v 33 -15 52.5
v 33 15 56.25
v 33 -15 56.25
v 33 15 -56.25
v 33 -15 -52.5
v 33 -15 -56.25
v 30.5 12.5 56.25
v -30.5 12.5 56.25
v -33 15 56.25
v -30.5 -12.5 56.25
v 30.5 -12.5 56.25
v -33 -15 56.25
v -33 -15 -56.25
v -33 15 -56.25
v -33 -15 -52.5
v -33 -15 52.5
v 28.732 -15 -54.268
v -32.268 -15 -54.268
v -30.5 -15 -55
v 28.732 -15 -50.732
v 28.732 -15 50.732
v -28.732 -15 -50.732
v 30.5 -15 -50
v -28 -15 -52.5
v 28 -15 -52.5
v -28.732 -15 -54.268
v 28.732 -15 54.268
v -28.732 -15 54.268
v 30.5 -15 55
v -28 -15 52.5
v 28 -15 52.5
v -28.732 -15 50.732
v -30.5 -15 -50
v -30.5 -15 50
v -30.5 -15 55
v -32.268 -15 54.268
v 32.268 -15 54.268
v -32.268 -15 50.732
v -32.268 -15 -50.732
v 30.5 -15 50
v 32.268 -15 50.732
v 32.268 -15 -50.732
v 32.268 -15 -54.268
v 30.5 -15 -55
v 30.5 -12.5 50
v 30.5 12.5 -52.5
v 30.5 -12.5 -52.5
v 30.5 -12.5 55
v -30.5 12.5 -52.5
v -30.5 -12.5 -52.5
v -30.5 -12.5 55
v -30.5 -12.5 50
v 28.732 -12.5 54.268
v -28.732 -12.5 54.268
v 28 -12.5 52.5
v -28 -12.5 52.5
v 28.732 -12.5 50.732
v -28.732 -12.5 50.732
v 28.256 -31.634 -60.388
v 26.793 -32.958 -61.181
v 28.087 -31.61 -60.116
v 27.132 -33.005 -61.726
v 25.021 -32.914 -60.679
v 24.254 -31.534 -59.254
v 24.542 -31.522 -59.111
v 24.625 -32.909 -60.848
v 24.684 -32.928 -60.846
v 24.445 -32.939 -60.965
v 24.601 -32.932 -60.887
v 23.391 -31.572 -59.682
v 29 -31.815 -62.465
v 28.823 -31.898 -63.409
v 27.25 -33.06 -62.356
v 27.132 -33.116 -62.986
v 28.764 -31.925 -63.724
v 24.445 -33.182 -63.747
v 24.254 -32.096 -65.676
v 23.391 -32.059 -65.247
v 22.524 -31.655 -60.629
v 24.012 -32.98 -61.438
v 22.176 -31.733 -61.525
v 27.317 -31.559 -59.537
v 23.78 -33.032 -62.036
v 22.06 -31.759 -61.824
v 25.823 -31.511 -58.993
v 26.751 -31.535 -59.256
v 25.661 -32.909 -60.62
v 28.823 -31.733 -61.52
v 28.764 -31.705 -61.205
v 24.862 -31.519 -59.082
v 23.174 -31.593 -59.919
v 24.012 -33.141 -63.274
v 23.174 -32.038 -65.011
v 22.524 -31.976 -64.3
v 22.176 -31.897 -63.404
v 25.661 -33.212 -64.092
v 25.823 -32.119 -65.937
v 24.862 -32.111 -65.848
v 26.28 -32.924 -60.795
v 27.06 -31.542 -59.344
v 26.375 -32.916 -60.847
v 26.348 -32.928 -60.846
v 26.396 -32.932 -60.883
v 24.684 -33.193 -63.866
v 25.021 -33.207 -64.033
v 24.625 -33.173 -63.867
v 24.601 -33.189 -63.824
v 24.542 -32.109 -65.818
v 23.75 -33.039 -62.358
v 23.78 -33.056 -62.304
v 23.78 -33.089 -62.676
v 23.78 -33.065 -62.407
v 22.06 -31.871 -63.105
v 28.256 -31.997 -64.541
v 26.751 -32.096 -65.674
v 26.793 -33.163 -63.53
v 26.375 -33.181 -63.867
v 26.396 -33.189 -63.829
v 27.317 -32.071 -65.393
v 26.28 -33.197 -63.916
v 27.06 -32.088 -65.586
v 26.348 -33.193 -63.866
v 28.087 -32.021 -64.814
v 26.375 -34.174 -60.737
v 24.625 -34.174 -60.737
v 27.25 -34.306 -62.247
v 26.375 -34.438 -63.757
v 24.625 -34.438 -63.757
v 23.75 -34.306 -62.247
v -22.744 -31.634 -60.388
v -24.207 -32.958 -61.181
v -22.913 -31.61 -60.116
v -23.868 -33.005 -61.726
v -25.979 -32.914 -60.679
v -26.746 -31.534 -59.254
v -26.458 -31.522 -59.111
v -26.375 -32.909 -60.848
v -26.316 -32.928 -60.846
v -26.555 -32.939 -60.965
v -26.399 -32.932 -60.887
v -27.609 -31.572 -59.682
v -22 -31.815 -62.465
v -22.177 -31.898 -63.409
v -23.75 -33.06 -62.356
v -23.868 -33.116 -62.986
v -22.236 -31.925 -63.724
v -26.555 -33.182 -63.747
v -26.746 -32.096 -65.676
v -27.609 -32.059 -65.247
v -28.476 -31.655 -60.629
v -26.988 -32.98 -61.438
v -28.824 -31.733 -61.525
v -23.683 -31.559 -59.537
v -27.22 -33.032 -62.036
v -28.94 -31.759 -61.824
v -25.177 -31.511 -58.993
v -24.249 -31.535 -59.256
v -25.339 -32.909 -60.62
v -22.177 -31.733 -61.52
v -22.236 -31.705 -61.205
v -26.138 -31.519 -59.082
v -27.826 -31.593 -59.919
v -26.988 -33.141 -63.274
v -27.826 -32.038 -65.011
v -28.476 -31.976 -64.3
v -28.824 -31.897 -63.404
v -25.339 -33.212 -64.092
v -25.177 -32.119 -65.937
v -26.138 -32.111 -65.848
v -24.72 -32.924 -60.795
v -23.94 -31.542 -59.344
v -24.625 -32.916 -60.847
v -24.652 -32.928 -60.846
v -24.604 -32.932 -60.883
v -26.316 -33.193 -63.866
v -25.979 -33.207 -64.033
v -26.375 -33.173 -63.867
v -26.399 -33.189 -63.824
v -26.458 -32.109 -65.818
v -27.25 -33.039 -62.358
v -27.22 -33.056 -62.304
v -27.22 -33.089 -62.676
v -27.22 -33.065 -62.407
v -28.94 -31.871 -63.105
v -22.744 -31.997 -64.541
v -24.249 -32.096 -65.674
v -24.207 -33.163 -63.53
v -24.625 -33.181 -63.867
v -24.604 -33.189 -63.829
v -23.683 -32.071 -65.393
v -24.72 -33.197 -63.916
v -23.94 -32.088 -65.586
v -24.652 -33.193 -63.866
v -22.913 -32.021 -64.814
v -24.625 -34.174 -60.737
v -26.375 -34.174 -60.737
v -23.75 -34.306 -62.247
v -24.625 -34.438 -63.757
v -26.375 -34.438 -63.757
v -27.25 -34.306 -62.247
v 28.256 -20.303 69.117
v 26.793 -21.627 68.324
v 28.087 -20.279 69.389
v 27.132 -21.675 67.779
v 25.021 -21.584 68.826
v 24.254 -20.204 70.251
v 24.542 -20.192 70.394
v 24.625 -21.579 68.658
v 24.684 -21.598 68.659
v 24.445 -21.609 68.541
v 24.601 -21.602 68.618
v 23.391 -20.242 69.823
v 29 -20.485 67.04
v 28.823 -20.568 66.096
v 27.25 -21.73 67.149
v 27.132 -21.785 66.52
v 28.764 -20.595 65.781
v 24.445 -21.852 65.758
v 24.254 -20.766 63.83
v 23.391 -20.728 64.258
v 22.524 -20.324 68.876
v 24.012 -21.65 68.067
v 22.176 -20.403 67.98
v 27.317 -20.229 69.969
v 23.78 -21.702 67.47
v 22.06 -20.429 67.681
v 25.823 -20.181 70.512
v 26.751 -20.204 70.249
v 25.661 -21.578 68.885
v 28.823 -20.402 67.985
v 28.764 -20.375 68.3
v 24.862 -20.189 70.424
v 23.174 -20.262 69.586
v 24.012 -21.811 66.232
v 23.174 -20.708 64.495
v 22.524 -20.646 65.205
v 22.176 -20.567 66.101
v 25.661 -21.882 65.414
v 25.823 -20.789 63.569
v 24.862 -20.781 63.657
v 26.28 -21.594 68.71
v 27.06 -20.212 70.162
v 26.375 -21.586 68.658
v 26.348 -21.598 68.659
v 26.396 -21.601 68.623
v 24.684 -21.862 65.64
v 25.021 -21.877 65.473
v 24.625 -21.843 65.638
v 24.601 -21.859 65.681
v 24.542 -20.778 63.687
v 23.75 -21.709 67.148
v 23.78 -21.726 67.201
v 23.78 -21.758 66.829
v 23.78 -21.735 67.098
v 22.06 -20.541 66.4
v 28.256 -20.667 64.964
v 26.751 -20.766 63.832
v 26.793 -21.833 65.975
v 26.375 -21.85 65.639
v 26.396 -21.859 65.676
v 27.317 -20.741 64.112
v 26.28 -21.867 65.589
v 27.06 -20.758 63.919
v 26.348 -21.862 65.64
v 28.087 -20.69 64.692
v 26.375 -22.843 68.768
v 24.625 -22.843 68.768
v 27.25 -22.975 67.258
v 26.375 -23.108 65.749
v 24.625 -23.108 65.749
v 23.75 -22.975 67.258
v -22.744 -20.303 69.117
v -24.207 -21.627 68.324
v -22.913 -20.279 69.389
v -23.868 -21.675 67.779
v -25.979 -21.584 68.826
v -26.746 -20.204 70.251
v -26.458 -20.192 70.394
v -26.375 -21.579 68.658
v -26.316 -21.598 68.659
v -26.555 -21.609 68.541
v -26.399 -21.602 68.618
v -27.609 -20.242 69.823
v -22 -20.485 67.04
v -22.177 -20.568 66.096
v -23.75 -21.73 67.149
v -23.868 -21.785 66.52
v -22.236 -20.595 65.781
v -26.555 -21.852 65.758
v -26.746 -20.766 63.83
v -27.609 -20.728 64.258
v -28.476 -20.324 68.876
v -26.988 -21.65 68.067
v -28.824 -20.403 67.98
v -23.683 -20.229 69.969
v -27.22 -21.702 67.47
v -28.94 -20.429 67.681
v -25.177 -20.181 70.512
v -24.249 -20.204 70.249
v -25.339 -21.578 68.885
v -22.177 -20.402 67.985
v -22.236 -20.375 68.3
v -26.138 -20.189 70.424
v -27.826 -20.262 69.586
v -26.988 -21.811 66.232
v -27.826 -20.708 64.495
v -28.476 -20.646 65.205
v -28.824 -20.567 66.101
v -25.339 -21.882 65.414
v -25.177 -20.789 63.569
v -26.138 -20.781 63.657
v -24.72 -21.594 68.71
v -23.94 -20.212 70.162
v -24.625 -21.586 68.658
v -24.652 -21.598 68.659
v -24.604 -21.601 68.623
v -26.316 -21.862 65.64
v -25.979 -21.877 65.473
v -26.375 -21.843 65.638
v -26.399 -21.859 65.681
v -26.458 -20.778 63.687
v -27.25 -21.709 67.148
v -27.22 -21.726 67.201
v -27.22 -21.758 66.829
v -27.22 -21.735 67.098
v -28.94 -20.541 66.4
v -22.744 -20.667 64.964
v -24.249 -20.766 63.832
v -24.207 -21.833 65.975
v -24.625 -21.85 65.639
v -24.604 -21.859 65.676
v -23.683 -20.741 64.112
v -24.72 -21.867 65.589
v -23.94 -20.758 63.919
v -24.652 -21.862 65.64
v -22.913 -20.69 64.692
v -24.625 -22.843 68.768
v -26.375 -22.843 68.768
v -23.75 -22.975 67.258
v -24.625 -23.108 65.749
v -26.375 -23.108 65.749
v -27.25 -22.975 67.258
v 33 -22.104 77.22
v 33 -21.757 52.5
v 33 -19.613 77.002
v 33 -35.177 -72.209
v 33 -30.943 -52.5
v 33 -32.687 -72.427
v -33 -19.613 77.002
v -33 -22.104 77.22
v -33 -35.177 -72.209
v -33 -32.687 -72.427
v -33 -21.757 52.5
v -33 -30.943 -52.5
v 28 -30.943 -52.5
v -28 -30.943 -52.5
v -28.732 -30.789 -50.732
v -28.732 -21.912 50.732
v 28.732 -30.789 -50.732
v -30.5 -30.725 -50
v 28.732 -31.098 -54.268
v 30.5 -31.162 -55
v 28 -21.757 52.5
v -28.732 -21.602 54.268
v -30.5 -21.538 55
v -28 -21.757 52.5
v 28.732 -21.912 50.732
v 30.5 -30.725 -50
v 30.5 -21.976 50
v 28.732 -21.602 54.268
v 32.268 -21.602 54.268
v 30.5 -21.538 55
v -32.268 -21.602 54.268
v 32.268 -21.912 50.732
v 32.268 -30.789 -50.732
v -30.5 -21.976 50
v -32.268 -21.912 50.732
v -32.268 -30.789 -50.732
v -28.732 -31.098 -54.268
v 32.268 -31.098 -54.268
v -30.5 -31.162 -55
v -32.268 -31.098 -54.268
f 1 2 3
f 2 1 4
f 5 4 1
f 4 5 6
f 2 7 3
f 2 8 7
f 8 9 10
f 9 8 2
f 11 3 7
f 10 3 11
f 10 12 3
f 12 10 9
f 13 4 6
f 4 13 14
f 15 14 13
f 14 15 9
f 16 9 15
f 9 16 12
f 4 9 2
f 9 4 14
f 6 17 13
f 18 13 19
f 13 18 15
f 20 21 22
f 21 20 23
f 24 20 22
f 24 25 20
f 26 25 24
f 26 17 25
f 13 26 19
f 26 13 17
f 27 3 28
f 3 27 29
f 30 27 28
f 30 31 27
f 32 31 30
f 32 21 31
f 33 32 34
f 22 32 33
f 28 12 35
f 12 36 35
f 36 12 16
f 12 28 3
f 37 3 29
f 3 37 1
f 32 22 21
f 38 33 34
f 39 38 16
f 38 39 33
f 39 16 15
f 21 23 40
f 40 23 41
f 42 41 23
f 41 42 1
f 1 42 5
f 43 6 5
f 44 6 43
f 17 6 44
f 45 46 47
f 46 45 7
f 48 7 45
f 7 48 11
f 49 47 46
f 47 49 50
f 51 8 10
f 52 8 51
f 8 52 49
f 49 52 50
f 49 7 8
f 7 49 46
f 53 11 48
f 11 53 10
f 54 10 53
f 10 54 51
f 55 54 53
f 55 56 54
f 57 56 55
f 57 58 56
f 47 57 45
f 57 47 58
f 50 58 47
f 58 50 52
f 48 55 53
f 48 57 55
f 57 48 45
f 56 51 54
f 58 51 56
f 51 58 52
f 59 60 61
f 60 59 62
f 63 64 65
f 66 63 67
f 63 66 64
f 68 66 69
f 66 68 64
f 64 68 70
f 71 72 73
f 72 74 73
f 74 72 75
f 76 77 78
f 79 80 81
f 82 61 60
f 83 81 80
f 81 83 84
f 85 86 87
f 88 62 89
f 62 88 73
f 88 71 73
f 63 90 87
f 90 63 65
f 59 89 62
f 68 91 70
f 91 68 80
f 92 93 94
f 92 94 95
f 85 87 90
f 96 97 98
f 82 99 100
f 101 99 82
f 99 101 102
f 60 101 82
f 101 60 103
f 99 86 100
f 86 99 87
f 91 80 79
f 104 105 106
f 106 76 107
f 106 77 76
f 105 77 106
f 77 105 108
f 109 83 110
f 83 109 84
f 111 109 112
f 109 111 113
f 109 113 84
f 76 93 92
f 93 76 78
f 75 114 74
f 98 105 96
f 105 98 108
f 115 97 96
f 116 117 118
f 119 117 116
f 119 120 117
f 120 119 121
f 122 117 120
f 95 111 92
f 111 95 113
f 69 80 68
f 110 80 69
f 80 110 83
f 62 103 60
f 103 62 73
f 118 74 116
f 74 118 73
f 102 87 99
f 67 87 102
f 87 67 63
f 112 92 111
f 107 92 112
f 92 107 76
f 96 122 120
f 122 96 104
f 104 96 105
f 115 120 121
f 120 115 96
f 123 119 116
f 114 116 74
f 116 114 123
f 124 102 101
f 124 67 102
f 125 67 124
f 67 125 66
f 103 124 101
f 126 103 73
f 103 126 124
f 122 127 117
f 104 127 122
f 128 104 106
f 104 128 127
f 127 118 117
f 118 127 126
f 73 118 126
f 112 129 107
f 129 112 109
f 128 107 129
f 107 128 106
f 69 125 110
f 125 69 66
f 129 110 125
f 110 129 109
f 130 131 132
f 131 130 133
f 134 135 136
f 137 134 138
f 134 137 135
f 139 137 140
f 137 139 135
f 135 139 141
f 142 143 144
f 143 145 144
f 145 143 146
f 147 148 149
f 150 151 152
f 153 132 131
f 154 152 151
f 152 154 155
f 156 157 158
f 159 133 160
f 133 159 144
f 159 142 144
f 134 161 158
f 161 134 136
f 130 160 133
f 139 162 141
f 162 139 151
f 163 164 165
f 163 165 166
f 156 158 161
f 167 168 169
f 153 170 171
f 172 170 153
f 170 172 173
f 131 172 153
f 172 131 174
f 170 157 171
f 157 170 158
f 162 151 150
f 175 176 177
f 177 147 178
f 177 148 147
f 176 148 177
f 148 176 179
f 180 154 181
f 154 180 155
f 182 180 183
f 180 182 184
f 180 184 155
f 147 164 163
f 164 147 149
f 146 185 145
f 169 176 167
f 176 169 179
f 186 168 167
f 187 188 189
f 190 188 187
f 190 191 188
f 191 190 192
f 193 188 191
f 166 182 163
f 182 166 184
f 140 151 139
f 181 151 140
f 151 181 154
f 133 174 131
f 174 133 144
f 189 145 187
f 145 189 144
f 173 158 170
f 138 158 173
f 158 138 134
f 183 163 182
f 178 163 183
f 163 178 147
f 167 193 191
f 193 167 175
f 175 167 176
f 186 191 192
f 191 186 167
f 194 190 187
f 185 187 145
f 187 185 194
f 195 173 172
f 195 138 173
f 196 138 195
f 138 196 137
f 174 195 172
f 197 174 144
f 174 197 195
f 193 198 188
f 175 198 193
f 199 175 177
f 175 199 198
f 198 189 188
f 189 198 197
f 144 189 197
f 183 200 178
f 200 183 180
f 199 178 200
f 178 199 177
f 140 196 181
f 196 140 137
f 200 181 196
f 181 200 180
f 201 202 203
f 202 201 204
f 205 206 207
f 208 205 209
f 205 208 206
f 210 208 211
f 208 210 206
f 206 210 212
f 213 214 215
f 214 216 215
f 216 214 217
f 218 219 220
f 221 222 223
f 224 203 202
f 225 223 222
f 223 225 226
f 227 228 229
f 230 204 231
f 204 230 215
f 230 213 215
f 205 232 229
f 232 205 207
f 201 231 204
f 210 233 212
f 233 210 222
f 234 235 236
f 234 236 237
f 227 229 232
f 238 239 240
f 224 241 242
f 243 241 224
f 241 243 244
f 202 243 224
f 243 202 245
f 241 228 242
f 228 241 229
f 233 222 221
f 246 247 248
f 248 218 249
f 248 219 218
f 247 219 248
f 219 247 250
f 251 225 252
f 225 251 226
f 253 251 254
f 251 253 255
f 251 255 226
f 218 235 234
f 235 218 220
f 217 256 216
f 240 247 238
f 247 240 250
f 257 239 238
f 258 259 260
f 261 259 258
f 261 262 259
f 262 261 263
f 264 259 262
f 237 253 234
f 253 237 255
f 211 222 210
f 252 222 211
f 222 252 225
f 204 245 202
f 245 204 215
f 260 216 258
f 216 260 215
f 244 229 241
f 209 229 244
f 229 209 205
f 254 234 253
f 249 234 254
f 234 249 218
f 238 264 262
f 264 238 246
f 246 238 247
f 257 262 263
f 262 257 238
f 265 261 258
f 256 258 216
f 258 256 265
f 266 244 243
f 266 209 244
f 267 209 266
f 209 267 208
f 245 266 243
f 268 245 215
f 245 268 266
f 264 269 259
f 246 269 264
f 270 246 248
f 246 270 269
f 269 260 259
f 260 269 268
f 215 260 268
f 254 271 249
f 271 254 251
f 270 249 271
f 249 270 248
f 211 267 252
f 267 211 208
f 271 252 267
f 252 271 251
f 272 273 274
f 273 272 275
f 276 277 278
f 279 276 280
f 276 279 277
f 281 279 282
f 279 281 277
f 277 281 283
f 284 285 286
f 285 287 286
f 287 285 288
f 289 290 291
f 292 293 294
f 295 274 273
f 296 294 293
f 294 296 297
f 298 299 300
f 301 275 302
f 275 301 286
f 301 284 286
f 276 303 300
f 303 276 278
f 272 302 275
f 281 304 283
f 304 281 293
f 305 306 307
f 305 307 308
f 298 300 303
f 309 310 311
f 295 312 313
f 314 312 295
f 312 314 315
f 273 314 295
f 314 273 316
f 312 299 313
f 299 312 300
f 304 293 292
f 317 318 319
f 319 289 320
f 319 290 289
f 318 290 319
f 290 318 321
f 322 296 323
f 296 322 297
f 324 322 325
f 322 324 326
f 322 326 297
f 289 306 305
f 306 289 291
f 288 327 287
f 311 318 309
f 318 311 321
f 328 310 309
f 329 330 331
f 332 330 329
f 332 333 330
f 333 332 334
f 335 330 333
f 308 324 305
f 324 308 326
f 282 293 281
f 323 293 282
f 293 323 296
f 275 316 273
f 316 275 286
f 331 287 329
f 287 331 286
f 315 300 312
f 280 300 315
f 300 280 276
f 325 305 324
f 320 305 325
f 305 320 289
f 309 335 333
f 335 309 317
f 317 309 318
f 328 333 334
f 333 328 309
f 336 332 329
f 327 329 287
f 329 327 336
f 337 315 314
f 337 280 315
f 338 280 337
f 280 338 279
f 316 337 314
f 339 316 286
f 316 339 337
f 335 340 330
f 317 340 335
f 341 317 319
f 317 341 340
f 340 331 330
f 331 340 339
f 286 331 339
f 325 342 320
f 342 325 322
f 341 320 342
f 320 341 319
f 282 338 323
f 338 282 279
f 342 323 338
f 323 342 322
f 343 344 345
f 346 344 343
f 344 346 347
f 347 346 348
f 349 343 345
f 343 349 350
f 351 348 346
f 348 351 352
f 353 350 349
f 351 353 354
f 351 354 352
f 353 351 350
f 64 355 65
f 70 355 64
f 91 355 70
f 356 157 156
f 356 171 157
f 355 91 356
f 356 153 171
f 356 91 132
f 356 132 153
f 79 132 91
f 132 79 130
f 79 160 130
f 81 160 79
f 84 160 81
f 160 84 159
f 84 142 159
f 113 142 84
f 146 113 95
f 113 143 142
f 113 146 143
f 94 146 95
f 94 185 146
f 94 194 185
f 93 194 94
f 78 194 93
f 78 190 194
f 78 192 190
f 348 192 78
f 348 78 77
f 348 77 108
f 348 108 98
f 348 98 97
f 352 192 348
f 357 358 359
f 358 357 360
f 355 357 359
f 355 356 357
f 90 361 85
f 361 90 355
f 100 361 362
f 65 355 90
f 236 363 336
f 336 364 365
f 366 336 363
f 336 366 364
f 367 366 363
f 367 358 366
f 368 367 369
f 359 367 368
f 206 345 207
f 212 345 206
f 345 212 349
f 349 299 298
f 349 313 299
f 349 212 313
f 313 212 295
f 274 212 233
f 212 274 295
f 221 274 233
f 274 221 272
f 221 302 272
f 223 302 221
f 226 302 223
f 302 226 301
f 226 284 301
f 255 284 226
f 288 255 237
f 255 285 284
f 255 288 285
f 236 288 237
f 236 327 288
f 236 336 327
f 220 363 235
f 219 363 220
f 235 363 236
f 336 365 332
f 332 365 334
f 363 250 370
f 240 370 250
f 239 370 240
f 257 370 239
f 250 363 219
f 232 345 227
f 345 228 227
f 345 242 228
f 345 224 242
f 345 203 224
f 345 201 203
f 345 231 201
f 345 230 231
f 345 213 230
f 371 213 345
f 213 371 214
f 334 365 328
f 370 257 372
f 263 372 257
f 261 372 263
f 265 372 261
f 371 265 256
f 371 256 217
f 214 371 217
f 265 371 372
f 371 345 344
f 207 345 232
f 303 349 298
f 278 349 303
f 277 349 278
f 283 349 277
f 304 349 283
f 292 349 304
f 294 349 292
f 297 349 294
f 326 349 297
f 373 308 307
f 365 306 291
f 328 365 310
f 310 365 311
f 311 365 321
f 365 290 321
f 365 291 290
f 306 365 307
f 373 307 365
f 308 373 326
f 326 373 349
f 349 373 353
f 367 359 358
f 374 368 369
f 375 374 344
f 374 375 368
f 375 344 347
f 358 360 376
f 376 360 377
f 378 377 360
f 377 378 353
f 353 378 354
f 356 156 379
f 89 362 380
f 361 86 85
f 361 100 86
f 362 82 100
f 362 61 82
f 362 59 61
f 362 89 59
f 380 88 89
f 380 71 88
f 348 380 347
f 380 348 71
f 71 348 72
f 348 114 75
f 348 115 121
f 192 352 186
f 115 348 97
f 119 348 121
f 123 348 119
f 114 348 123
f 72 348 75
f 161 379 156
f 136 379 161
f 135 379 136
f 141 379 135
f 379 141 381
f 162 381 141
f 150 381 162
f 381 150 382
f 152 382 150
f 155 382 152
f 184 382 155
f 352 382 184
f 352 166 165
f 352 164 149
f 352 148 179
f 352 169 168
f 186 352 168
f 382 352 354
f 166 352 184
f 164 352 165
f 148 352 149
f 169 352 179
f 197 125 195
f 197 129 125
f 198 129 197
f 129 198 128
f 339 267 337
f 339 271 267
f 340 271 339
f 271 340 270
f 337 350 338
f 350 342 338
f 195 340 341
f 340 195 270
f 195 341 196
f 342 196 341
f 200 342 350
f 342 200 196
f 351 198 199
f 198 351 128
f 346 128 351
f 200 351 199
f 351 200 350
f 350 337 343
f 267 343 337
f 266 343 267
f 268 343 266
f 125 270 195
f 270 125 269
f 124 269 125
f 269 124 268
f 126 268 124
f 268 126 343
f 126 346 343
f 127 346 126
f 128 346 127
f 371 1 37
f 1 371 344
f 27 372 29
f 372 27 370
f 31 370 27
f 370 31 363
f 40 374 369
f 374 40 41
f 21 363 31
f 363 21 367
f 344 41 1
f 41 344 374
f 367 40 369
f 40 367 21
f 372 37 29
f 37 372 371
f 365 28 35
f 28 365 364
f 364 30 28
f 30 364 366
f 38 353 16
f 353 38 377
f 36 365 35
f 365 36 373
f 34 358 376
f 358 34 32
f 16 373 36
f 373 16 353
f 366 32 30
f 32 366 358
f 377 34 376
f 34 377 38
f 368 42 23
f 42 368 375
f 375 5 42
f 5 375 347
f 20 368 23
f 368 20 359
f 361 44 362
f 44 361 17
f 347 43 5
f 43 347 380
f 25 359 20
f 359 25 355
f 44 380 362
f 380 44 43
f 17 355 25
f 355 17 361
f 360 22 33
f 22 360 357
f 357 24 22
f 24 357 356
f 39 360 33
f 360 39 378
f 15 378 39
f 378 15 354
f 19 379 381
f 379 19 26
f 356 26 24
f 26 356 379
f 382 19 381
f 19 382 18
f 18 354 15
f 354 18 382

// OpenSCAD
width=61;
depth=25;
length=110;
caseThickness=2.5;
mountingLipLength=20;
screwDiameter=3.5;

module screwHole () {
    color("green",1.0) {
        translate([0,0,caseThickness/2])
            cylinder(h = caseThickness, d1 = screwDiameter, d2 = screwDiameter*3, center = true);
        translate([0,0,-caseThickness]){
            cylinder(h=(caseThickness*2), d=screwDiameter);
        };
    }
}

module box() {
    difference() {
        cube([width+2*caseThickness,depth+2*caseThickness,length+1*caseThickness], center = true);
        translate([0,0,caseThickness])
            cube([width,depth,length], center = true);
    }
}

module mountPlate() {
    difference() {
        color("blue", 1.0) {
            cube([width+2*caseThickness,caseThickness,length+2*mountingLipLength], center = true);
        }
        rotate([-90,0,0]) {
            translate([(width-10)/2,(length+mountingLipLength)/2,0])
                screwHole();
            translate([-(width-10)/2,(length+mountingLipLength)/2,0])
                screwHole();
            translate([(width-10)/2,-(length+mountingLipLength)/2,0])
                screwHole();
            translate([-(width-10)/2,-(length+mountingLipLength)/2,0])
                screwHole();
        }
    }
}

module mountSupports() {
    color("red", 1.0) {
        // Top left
        translate([width/2,-(depth/2+2*caseThickness),length/2-caseThickness])
            rotate([90,0,0])
                cylinder(h = 10, d = 5, center = true);
        // Top right
        translate([-width/2,-(depth/2+2*caseThickness),length/2-caseThickness])
            rotate([90,0,0])
                cylinder(h = 10, d = 5, center = true);
        // Bottom left
        translate([width/2,-(depth/2+2*caseThickness)-5,-(length/2-caseThickness)])
            rotate([90,0,0])
                cylinder(h = 19, d = 5, center = true);
        // Bottom right
        translate([-width/2,-(depth/2+2*caseThickness)-5,-(length/2-caseThickness)])
            rotate([90,0,0])
                cylinder(h = 19, d = 5, center = true);
    }
}

module UnderDeskAircoRemoteControlStorage() {
    union () {
        box();
        rotate([-5,0,0])
            translate([0,-(depth+1*caseThickness),0])
                mountPlate();
        mountSupports();
    }
}

UnderDeskAircoRemoteControlStorage();
